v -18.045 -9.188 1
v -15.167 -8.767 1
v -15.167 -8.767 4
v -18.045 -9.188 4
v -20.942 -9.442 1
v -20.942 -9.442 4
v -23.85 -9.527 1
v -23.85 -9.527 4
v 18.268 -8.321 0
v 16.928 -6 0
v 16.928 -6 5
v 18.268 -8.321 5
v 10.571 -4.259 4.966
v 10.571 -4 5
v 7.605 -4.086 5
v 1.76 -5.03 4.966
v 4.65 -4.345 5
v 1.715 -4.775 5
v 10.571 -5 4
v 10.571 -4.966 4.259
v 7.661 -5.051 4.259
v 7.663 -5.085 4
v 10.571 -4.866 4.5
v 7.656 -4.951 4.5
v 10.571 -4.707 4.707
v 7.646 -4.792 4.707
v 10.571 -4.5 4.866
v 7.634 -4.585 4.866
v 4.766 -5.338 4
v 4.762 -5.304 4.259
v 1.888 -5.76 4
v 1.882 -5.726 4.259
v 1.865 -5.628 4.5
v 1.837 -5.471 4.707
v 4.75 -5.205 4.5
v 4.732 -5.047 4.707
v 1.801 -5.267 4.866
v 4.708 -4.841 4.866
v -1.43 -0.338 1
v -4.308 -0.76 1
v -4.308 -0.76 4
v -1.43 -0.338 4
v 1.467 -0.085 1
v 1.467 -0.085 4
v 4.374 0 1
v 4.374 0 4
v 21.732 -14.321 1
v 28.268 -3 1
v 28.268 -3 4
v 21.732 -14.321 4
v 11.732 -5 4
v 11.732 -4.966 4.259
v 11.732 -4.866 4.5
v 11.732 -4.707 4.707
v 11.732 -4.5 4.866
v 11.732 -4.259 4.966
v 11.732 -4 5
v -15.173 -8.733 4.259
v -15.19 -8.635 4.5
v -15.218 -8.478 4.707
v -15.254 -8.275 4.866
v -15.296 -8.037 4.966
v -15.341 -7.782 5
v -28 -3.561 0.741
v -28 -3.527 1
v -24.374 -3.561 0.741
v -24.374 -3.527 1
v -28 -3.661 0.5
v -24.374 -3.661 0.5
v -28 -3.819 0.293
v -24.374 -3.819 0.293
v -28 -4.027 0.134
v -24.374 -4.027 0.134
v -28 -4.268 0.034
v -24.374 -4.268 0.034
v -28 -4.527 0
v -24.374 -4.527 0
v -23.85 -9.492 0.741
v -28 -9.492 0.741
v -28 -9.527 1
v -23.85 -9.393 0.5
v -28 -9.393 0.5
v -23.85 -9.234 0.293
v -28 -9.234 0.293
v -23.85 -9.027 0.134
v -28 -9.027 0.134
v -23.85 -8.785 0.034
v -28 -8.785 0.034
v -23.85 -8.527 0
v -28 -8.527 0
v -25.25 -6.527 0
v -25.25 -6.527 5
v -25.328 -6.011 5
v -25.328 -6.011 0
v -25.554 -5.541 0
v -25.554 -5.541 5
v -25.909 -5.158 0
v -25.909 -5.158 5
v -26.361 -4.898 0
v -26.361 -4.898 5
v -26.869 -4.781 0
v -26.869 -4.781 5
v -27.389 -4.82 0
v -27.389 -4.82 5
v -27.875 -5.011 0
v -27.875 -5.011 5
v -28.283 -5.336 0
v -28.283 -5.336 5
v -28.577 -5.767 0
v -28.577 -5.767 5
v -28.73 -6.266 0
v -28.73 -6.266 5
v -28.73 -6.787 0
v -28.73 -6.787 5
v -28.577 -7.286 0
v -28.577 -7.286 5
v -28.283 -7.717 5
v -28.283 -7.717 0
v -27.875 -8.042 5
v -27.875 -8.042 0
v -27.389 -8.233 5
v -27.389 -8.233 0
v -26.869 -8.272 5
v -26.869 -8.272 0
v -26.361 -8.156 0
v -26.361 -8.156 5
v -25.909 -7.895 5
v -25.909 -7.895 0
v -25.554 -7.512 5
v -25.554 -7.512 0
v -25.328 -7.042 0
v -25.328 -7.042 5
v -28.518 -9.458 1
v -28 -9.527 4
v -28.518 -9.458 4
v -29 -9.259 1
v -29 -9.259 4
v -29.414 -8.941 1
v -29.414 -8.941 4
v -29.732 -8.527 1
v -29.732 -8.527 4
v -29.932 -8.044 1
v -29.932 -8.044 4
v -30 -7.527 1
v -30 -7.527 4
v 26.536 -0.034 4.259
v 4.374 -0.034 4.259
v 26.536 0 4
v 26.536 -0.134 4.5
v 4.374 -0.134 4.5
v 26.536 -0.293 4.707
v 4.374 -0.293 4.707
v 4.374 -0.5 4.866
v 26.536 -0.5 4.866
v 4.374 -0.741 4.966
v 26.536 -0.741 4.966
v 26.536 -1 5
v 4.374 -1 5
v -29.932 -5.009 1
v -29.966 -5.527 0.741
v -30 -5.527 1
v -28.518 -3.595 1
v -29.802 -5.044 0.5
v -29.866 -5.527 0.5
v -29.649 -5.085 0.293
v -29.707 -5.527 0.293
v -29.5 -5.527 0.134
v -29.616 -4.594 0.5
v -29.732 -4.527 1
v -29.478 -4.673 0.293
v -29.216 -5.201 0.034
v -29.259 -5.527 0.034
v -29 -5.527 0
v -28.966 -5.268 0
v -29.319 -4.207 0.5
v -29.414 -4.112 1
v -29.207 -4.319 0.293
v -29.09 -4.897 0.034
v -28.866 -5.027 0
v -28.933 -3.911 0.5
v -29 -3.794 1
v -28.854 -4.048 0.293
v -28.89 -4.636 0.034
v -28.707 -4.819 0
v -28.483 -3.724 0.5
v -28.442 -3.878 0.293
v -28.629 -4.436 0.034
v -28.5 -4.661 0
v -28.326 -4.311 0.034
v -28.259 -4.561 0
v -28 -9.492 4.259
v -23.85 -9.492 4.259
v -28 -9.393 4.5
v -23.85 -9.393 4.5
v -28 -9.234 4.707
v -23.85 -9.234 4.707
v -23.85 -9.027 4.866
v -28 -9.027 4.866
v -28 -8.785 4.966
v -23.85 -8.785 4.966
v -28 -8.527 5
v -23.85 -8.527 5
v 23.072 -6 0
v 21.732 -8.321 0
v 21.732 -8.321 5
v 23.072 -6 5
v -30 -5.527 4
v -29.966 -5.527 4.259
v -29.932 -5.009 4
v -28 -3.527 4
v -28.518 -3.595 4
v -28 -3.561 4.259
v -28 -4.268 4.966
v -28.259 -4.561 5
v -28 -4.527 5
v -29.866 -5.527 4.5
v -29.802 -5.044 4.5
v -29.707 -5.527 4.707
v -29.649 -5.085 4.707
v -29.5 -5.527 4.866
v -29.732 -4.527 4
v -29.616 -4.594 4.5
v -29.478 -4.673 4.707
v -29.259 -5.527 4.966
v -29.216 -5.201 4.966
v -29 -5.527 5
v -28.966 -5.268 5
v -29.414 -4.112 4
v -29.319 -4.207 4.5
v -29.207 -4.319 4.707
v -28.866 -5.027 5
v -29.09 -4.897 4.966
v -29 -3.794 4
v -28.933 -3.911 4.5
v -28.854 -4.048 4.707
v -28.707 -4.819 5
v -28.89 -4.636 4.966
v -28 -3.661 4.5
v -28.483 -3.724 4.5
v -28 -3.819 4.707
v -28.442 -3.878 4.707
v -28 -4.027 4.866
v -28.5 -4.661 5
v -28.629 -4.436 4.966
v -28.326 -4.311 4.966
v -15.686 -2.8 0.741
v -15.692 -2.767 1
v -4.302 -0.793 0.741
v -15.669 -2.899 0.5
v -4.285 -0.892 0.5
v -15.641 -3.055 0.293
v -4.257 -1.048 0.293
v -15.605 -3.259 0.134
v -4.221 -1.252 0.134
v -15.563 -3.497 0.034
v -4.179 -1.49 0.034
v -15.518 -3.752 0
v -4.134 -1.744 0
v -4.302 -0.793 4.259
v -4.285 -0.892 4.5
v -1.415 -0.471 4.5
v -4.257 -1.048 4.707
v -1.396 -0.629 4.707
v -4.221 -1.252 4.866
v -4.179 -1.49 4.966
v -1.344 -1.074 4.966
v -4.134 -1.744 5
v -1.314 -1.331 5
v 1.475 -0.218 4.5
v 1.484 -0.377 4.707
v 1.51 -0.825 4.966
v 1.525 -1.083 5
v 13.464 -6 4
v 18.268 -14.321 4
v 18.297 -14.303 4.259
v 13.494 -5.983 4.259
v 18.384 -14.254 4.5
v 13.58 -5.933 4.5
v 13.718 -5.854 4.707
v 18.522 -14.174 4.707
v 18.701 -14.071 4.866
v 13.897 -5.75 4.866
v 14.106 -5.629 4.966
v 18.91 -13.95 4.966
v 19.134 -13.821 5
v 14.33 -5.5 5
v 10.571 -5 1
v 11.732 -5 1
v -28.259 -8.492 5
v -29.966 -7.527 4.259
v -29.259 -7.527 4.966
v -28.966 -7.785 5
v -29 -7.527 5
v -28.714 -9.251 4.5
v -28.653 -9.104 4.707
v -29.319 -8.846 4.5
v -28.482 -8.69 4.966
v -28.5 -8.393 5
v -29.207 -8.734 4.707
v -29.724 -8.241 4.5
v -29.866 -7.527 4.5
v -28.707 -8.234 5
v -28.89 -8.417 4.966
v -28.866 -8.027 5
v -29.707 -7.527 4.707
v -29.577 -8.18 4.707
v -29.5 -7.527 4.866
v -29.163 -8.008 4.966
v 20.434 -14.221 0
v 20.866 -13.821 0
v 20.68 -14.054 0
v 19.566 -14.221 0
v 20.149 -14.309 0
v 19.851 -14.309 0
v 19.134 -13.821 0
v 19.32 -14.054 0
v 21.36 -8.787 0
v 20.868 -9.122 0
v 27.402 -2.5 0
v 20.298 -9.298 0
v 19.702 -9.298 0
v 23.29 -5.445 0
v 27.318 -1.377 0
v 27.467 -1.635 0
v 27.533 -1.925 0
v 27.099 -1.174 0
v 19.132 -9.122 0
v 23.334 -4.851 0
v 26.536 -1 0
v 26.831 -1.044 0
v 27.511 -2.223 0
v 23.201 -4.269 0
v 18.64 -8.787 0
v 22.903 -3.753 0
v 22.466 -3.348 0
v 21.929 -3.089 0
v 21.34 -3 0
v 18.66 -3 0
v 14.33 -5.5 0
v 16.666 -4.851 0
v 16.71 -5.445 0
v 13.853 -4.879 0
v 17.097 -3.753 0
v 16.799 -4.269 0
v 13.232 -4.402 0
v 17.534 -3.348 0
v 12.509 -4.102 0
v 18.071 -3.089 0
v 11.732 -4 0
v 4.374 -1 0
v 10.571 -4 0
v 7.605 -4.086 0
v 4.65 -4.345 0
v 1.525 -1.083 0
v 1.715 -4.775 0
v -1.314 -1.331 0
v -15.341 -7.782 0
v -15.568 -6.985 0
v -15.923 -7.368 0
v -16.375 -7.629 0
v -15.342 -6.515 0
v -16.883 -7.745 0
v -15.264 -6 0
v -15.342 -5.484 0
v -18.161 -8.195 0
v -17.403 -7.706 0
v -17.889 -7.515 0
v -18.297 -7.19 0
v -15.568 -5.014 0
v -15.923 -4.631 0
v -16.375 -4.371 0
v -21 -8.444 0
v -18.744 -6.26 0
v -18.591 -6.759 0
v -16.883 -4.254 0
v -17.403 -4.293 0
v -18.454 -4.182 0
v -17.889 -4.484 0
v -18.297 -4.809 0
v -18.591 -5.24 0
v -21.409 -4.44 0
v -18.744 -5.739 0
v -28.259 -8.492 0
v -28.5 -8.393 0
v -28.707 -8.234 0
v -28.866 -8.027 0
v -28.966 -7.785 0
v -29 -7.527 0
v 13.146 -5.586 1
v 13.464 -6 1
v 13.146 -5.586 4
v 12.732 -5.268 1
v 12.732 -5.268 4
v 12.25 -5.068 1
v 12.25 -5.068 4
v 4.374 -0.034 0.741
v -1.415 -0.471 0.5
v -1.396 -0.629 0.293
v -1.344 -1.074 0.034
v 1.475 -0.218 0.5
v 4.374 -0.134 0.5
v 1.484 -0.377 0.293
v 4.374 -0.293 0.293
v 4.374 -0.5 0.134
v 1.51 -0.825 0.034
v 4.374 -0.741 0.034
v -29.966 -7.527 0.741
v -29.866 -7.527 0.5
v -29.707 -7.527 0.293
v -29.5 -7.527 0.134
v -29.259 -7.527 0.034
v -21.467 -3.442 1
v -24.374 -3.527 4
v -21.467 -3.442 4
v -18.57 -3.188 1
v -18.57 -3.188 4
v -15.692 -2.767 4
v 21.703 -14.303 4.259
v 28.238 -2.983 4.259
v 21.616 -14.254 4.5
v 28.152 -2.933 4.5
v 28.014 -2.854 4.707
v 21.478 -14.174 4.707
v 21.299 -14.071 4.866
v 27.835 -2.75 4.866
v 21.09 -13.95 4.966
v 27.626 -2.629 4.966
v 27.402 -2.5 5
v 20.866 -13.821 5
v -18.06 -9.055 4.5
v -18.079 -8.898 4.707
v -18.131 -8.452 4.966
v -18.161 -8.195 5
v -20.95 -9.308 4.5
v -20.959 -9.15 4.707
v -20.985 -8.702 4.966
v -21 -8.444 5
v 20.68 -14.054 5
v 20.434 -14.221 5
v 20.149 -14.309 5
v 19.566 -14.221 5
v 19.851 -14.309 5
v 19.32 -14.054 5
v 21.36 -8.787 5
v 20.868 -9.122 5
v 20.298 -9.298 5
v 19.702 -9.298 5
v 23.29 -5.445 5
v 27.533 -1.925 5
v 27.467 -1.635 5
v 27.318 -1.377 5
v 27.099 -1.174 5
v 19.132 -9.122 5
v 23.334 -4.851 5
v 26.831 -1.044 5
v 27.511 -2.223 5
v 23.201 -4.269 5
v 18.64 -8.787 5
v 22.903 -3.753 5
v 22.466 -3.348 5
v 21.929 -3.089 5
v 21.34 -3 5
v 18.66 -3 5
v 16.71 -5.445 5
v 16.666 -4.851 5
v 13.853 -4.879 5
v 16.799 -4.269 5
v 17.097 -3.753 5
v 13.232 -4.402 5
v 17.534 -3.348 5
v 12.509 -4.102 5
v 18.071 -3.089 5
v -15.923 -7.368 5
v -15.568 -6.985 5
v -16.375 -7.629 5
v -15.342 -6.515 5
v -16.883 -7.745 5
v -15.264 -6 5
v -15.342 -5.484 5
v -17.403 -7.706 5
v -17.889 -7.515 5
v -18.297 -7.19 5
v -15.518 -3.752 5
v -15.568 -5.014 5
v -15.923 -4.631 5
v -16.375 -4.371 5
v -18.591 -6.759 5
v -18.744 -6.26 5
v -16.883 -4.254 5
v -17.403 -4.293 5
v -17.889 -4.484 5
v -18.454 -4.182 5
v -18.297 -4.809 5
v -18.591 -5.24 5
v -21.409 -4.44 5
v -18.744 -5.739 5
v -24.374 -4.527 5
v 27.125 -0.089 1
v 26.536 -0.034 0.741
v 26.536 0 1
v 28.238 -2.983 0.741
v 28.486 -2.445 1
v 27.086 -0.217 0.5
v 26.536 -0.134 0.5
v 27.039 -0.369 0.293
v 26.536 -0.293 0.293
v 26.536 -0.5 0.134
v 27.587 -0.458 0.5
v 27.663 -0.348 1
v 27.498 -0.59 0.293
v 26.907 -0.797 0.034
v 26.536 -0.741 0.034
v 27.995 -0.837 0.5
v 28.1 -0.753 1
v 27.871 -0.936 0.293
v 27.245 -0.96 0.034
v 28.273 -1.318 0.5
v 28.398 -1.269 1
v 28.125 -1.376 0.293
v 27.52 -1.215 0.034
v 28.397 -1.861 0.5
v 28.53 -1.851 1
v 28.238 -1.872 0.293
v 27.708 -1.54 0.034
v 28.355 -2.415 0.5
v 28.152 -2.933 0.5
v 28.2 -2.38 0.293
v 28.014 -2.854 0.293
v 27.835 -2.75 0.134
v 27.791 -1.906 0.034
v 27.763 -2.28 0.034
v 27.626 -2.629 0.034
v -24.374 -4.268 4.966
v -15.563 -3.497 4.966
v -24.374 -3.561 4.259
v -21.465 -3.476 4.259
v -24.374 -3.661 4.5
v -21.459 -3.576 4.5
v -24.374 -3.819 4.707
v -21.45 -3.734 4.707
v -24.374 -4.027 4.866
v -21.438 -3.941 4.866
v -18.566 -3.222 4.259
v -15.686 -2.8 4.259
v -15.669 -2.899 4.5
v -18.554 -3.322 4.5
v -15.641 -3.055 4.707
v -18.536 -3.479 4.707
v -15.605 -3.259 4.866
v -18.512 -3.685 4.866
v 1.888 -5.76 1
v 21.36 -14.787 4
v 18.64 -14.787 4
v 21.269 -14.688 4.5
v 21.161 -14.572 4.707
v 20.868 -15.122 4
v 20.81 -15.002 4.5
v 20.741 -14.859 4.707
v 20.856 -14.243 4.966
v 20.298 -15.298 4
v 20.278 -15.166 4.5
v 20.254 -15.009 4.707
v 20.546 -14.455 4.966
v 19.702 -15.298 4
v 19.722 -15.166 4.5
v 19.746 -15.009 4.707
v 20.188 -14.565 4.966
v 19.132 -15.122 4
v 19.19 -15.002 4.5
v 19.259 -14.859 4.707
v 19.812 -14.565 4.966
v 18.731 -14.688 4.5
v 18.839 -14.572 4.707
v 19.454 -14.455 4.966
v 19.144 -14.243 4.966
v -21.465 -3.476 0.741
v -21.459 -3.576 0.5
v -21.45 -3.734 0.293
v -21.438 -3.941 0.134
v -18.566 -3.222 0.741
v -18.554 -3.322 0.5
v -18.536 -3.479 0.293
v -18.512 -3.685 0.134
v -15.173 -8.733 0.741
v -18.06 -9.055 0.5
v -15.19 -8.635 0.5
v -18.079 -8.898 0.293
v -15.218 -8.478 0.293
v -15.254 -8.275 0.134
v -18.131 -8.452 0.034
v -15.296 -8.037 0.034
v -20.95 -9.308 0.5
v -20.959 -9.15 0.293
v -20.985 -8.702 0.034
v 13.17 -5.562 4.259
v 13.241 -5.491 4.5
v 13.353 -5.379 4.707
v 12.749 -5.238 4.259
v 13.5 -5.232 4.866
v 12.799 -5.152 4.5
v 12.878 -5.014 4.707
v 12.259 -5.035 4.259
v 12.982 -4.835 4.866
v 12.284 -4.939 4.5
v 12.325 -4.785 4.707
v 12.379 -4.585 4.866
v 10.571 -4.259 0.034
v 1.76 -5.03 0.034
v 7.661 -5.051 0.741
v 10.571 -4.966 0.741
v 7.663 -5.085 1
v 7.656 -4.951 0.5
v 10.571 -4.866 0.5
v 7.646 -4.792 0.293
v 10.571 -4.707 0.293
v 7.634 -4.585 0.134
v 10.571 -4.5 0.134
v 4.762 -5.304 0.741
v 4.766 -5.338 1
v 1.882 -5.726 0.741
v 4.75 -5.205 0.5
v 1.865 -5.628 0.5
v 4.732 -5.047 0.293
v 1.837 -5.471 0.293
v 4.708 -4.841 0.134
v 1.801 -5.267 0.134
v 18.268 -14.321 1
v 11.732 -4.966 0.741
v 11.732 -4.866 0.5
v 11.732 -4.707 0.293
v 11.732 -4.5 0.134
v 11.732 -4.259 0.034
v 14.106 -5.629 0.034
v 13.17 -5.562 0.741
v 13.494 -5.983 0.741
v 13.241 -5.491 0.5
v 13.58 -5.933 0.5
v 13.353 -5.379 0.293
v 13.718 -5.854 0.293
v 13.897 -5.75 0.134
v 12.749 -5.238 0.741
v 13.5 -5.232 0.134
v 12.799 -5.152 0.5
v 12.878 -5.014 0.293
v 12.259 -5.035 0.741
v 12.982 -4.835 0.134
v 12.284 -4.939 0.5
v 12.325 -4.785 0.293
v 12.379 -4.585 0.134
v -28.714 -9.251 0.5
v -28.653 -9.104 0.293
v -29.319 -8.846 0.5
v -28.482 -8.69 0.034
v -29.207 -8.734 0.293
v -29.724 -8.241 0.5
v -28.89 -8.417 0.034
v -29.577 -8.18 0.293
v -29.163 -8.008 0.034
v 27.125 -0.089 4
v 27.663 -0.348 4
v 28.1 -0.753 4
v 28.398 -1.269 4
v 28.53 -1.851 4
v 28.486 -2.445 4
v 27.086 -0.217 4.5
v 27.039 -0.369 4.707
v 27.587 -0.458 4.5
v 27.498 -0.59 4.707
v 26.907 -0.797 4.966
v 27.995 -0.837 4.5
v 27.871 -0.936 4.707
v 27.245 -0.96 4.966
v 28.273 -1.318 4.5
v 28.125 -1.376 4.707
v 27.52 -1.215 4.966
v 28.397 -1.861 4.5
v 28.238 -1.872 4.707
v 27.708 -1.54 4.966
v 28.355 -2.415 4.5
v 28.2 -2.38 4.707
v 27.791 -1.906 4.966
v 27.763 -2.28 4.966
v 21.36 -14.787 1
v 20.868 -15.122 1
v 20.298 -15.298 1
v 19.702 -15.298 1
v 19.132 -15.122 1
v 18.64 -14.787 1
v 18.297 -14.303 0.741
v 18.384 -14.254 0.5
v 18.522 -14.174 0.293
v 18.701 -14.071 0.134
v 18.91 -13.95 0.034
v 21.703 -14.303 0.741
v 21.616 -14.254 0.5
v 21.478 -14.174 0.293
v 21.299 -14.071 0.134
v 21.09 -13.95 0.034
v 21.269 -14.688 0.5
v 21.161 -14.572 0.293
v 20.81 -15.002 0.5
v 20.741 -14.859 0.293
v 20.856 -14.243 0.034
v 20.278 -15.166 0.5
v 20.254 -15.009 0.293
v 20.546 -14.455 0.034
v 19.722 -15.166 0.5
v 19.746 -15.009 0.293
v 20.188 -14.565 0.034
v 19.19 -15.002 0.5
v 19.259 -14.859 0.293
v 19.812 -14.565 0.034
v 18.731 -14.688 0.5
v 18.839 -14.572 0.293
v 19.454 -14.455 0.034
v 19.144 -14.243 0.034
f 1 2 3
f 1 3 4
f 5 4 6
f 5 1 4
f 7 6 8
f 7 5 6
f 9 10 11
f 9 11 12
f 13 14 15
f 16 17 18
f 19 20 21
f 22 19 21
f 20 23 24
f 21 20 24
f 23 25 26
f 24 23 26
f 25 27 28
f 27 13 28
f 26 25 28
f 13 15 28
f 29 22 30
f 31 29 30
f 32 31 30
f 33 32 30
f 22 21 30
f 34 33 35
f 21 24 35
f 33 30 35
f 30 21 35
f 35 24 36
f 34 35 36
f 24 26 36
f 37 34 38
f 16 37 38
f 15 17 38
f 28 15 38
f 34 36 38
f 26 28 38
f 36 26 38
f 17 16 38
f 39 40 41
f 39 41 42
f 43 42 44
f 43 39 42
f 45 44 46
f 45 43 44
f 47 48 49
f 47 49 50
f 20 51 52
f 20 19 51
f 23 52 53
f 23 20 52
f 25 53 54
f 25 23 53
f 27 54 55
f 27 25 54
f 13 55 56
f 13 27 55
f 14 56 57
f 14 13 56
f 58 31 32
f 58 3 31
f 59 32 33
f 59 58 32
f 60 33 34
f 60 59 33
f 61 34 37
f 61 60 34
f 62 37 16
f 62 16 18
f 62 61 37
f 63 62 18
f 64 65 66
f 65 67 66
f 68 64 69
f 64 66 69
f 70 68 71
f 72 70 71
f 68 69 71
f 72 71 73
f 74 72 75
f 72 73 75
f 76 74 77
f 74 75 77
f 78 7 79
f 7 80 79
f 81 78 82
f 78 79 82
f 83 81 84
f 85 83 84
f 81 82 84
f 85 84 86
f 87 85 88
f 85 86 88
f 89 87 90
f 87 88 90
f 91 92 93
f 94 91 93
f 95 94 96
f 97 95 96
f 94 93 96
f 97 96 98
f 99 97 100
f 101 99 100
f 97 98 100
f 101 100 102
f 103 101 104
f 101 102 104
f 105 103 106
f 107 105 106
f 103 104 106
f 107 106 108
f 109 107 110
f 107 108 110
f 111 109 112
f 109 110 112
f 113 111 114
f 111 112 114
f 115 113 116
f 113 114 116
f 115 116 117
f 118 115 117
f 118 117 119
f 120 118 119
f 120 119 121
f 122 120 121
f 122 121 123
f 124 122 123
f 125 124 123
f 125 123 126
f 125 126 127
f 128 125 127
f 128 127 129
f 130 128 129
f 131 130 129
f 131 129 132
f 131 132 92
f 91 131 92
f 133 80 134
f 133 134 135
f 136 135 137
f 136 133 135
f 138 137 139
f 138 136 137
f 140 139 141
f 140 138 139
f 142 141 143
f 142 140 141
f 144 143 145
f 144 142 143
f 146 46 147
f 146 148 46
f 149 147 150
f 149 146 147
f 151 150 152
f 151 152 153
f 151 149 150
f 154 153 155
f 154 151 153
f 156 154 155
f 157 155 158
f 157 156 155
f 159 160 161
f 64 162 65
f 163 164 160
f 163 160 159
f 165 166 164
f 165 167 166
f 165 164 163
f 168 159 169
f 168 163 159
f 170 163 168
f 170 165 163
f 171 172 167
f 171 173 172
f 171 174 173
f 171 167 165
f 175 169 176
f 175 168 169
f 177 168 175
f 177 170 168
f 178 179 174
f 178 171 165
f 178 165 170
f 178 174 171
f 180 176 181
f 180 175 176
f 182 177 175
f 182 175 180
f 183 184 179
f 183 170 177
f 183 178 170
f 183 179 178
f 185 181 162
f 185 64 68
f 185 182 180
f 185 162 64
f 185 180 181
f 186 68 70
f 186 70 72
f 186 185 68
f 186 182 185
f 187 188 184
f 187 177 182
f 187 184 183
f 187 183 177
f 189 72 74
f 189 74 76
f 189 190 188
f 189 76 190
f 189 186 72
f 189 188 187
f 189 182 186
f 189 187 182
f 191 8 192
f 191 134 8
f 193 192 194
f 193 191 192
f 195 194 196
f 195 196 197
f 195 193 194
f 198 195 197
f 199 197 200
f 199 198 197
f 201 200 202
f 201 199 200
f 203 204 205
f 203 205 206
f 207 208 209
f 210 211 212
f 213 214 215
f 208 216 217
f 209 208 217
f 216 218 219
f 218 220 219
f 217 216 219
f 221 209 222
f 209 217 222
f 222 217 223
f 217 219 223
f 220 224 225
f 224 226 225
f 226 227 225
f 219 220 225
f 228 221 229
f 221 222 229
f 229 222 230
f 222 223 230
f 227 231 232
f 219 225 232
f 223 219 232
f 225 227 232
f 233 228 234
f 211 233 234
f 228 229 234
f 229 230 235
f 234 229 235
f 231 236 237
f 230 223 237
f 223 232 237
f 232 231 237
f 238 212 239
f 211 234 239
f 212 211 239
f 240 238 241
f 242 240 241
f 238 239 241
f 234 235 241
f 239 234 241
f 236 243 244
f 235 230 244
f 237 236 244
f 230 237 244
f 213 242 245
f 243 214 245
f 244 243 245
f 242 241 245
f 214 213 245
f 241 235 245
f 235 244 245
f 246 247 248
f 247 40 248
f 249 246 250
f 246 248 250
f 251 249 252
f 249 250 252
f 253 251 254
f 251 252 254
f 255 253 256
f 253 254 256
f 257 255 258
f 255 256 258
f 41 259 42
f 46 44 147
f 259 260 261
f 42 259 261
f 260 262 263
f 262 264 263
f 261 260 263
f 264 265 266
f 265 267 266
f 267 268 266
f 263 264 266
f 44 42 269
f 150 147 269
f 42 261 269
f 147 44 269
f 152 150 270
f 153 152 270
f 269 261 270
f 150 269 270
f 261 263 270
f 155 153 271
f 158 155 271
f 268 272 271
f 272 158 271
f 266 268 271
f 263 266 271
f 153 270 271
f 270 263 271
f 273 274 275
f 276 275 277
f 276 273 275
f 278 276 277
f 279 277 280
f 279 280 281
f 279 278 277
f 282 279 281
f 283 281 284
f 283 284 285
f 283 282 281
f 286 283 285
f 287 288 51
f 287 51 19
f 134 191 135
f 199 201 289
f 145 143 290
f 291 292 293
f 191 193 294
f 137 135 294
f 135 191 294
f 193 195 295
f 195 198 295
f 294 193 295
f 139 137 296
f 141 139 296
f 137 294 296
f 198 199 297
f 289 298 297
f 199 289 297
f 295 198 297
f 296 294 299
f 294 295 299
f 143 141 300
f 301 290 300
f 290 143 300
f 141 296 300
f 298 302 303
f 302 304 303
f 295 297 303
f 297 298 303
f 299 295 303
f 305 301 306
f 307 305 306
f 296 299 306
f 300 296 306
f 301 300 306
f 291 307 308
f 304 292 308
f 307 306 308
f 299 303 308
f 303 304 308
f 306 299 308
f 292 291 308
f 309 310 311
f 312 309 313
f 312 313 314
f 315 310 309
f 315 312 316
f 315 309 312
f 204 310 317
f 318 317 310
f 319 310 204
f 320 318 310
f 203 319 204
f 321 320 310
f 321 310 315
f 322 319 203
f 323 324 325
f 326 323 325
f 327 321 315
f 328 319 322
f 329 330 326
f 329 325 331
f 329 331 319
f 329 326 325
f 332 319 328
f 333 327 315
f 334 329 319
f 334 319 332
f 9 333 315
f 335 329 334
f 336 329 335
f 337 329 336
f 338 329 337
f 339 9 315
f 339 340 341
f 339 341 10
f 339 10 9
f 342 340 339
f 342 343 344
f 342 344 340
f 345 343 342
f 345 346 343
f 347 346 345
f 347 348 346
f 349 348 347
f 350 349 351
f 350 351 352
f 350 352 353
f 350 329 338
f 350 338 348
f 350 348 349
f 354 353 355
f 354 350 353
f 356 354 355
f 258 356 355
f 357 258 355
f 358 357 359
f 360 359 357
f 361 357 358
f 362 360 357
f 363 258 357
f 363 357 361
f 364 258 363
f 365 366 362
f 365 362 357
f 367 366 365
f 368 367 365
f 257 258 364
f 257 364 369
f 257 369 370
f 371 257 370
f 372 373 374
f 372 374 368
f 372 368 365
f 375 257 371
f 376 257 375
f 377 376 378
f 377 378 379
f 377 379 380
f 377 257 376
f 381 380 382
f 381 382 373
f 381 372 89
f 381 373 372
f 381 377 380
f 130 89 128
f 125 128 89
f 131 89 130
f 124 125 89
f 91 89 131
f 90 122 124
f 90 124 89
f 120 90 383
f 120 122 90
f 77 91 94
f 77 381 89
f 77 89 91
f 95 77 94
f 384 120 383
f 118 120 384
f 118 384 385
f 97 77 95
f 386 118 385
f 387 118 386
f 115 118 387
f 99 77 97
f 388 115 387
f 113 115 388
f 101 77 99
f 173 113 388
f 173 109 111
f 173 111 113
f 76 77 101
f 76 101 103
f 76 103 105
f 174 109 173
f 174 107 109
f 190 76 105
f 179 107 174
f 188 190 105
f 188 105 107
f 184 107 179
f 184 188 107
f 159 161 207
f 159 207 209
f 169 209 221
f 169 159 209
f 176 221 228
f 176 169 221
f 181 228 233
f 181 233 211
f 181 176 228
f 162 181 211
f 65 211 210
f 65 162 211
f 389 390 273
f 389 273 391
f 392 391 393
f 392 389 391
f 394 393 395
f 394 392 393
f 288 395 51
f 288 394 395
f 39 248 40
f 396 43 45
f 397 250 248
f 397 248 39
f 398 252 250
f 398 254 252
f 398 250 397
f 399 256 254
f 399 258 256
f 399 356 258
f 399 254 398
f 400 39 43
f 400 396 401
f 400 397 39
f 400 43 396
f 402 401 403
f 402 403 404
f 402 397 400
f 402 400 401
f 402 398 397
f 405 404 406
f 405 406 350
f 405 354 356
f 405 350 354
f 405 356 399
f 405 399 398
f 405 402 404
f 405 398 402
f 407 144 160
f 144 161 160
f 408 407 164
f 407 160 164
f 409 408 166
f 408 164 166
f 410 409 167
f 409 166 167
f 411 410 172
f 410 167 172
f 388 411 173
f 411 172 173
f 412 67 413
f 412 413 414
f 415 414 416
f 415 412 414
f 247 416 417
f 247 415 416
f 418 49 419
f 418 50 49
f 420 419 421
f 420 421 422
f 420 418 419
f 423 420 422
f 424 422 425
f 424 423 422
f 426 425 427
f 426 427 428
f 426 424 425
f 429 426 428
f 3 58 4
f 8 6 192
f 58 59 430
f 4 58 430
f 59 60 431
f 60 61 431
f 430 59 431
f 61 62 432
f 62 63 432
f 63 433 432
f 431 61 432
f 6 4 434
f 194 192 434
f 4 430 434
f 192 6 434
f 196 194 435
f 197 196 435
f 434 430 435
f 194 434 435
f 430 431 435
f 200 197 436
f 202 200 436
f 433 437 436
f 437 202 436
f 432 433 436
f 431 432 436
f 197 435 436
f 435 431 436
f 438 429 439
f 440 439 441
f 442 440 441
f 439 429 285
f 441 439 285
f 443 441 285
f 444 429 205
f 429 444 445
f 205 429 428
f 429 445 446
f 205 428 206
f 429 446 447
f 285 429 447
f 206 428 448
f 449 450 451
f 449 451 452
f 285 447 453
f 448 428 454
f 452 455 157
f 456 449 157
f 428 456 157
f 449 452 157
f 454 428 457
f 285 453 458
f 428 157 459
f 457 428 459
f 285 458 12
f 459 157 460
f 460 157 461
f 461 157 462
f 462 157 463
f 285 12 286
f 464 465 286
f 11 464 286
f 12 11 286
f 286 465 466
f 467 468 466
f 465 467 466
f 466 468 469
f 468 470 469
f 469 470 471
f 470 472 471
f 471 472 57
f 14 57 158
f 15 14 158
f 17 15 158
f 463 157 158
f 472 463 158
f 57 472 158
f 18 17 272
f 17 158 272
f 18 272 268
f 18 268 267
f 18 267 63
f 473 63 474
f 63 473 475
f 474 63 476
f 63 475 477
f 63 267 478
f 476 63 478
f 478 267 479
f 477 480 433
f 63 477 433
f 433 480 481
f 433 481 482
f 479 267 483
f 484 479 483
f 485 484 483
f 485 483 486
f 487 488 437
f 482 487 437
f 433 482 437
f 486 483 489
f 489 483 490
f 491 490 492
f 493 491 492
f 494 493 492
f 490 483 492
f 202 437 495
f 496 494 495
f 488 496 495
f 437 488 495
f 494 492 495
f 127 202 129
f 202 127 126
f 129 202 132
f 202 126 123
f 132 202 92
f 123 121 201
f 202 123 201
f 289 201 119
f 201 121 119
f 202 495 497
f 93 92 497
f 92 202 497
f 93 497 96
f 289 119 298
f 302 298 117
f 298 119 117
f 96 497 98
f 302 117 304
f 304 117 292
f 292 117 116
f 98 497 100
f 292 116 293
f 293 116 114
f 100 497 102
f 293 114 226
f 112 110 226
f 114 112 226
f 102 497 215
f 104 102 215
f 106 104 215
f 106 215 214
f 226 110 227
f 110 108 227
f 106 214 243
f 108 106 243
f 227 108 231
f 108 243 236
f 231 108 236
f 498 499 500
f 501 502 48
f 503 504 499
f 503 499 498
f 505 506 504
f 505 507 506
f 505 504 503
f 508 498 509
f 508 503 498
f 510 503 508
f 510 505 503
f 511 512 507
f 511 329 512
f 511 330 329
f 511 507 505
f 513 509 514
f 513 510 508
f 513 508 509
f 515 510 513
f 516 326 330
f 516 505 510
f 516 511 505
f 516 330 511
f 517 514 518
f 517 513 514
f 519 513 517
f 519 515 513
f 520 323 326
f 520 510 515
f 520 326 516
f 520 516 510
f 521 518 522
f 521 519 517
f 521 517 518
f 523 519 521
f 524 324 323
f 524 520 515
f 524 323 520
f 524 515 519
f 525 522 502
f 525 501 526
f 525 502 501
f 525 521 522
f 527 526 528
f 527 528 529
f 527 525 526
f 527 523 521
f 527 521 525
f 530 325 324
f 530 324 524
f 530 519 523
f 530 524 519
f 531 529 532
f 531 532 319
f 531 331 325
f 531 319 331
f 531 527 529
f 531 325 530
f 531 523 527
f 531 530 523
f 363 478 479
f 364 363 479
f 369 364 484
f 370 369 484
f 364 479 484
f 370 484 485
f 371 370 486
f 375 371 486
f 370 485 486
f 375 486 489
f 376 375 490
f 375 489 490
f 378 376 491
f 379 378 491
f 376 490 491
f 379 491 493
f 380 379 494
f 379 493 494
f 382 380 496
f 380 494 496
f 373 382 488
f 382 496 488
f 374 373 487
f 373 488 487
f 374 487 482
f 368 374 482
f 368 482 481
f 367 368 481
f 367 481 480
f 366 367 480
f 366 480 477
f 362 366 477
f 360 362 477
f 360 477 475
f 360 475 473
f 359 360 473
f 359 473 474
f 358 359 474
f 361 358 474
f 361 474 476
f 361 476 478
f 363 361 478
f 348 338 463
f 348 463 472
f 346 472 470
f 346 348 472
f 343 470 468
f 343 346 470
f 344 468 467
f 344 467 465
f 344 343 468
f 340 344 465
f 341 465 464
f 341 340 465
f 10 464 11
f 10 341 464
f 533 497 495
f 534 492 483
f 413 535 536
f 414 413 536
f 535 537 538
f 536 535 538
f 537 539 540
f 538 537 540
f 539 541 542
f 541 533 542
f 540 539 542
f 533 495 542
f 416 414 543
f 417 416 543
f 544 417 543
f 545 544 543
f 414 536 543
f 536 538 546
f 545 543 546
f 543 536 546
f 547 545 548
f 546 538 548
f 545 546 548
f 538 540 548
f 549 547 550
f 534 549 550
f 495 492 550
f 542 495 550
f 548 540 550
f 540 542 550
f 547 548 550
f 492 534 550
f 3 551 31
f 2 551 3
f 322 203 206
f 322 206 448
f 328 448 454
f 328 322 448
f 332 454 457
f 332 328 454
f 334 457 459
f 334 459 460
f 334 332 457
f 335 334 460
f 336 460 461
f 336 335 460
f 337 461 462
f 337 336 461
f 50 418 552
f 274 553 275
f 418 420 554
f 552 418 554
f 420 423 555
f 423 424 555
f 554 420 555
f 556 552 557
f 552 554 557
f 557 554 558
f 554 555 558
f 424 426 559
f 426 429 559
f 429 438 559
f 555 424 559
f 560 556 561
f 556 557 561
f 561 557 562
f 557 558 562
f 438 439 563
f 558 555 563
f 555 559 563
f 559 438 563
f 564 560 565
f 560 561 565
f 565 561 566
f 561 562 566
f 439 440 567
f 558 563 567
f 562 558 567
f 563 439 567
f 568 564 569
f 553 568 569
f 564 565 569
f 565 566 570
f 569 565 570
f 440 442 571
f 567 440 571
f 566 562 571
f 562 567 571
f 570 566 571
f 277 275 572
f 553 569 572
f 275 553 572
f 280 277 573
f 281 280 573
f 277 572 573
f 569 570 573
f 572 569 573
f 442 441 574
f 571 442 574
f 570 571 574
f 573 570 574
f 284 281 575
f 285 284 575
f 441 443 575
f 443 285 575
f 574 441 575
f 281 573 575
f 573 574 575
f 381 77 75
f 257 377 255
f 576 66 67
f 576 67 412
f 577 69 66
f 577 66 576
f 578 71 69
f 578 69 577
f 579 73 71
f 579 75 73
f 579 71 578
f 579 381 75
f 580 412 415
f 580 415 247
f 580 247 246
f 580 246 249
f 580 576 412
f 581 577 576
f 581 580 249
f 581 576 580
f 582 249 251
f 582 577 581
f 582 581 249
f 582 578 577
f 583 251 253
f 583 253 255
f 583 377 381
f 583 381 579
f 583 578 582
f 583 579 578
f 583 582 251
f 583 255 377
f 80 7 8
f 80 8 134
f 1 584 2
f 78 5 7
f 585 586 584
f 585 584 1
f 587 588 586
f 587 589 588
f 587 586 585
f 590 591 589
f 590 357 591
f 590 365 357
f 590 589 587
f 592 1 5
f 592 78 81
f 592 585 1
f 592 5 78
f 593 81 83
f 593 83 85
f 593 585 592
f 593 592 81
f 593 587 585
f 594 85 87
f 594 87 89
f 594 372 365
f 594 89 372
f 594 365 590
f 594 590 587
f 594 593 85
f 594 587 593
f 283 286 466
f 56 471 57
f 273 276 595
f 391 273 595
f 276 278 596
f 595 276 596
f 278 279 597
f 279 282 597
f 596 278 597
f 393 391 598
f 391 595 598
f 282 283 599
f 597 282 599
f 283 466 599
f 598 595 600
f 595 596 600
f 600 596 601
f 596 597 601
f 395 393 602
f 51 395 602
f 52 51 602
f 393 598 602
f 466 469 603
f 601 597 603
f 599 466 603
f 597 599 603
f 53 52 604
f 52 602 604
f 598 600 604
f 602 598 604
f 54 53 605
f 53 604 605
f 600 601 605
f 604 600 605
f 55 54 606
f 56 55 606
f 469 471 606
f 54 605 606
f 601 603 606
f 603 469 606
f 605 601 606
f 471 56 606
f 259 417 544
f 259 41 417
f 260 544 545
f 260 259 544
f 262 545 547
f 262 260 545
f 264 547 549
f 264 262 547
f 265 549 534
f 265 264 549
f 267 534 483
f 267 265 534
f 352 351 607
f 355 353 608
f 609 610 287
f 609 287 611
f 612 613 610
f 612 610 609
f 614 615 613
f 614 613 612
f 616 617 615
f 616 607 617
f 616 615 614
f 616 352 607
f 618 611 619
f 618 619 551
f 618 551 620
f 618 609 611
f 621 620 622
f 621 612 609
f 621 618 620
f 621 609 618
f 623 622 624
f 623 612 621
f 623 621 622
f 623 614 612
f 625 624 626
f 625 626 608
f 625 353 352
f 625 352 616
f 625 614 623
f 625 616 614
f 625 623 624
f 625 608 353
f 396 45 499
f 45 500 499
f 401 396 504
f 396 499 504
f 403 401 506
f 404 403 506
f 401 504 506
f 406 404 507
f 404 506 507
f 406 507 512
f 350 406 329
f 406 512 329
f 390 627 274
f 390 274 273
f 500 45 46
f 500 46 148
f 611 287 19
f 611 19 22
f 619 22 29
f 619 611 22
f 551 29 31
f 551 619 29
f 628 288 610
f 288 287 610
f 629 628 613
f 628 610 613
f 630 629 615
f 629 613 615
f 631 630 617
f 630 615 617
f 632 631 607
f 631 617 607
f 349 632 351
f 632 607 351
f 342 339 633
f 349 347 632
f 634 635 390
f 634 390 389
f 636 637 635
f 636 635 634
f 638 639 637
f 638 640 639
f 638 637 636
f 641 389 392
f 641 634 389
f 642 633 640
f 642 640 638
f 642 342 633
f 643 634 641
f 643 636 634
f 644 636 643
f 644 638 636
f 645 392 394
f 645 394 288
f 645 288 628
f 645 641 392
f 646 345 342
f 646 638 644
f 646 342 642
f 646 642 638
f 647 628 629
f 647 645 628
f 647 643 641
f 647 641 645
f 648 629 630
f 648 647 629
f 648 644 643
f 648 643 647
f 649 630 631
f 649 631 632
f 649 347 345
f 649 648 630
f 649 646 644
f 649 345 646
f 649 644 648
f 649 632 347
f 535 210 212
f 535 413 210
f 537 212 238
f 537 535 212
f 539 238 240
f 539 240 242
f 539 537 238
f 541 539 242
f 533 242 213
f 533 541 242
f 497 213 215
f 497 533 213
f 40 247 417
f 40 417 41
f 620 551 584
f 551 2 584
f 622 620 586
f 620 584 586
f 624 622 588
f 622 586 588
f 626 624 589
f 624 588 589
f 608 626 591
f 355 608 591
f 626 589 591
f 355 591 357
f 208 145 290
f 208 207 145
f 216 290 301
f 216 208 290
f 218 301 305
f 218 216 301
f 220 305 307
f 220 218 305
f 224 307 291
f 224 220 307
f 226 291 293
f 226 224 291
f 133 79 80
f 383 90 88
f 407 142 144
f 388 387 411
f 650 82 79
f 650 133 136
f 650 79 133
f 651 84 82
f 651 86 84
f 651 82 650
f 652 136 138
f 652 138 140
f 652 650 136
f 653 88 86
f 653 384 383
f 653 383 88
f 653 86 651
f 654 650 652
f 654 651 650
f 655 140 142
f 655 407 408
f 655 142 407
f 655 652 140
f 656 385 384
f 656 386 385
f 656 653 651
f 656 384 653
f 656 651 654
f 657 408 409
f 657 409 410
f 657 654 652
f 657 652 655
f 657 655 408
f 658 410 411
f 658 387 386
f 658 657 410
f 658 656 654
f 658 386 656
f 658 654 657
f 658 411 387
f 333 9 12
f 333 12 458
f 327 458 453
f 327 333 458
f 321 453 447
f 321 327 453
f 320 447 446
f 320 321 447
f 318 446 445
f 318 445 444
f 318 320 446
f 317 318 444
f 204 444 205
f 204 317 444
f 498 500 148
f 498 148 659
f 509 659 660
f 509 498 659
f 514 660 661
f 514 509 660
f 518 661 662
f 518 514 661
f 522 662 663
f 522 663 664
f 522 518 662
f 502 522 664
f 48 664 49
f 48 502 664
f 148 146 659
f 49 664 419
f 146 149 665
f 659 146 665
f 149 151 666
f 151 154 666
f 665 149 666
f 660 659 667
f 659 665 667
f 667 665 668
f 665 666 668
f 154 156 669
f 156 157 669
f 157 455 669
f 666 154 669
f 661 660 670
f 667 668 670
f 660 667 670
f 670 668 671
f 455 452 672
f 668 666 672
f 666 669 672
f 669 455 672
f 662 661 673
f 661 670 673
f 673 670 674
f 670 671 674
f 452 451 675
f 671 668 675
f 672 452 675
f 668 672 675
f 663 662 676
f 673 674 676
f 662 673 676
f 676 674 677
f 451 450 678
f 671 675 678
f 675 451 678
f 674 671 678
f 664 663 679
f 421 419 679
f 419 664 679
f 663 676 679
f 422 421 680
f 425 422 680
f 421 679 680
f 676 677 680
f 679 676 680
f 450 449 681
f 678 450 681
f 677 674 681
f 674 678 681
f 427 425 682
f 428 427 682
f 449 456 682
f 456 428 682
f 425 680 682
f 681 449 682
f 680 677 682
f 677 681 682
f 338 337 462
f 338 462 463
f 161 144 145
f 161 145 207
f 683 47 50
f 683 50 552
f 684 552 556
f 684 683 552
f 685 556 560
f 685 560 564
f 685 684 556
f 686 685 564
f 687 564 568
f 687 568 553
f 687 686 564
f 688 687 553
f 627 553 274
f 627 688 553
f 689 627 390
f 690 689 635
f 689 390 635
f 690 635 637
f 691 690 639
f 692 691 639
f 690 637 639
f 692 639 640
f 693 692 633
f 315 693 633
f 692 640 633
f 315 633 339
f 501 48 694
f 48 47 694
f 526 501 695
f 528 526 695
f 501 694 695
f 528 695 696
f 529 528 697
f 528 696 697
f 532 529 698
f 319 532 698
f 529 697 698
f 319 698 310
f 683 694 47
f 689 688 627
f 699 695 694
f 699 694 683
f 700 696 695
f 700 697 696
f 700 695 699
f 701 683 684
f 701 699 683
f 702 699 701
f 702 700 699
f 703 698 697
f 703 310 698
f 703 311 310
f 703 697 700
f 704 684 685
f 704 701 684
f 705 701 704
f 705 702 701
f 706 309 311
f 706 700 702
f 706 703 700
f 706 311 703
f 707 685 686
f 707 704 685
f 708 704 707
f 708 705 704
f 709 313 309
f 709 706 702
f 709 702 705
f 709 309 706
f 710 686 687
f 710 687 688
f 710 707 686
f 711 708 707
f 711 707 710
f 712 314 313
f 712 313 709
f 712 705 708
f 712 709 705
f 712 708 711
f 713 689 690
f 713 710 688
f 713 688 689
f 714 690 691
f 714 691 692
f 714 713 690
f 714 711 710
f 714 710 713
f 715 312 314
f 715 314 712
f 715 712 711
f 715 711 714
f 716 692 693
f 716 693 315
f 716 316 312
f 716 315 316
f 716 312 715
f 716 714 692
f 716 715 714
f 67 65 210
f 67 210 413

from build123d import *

# Parameters (mm, degrees)
BOSS_EXTRUDE1_DEPTH = 5
FILLET1_R           = 1
SKETCH2_R           = 1.75
CUT_EXTRUDE1_DEPTH  = 35.054632191


with BuildPart() as part:
    # Sketch1 → Boss-Extrude1 (new body)
    with BuildSketch(Plane.XY):
        with BuildLine():
            Line((4.374433176, 0), (26.535898385, 0))
            ThreePointArc((26.535898385, 0), (28.267949192, -1), (28.267949192, -3))
            Line((28.267949192, -3), (21.732050808, -14.320508076))
            ThreePointArc((21.732050808, -14.320508076), (20, -15.320508076), (18.267949192, -14.320508076))
            Line((18.267949192, -14.320508076), (13.464101615, -6))
            ThreePointArc((13.464101615, -6), (12.732050808, -5.267949192), (11.732050808, -5))
            Line((11.732050808, -5), (10.570646977, -5))
            ThreePointArc((10.570646977, -5), (6.21285984, -5.190265095), (1.888238094, -5.759612349))
            Line((1.888238094, -5.759612349), (-15.167092312, -8.766927265))
            ThreePointArc((-15.167092312, -8.766927265), (-19.491714058, -9.336274519), (-23.849501195, -9.526539614))
            Line((-23.849501195, -9.526539614), (-28, -9.526539614))
            ThreePointArc((-28, -9.526539614), (-29.414213562, -8.940753177), (-30, -7.526539614))
            Line((-30, -7.526539614), (-30, -5.526539614))
            ThreePointArc((-30, -5.526539614), (-29.414213562, -4.112326052), (-28, -3.526539614))
            Line((-28, -3.526539614), (-24.374433176, -3.526539614))
            ThreePointArc((-24.374433176, -3.526539614), (-20.016646039, -3.336274519), (-15.692024293, -2.766927265))
            Line((-15.692024293, -2.766927265), (-4.307975707, -0.759612349))
            ThreePointArc((-4.307975707, -0.759612349), (0.016646039, -0.190265095), (4.374433176, 0))
        make_face()
        with BuildLine():
            Line((21.732050808, -8.320508076), (23.07179677, -6))
            ThreePointArc((23.07179677, -6), (23.07179677, -4), (21.339745962, -3))
            Line((21.339745962, -3), (18.660254038, -3))
            ThreePointArc((18.660254038, -3), (16.92820323, -4), (16.92820323, -6))
            Line((16.92820323, -6), (18.267949192, -8.320508076))
            ThreePointArc((18.267949192, -8.320508076), (20, -9.320508076), (21.732050808, -8.320508076))
        make_face(mode=Mode.SUBTRACT)
    extrude(amount=BOSS_EXTRUDE1_DEPTH)

    # Fillet1
    fillet1_edges = [part.edges().sort_by_distance(p)[0] for p in [
        (-19.491714058, -9.336274519, 5),
        (-6.639427109, -7.263269807, 5),
        (-30, -6.526539614, 0),
        (-29.414213562, -4.112326052, 0),
        (-26.187216588, -3.526539614, 0),
        (-20.016646039, -3.336274519, 0),
        (-10, -1.763269807, 0),
        (0.016646039, -0.190265095, 0),
        (15.455165781, 0, 0),
        (28.267949192, -1, 0),
        (25, -8.660254038, 0),
        (6.21285984, -5.190265095, 5),
        (20, -15.320508076, 0),
        (15.866025404, -10.160254038, 0),
        (12.732050808, -5.267949192, 0),
        (11.151348892, -5, 0),
        (6.21285984, -5.190265095, 0),
        (-6.639427109, -7.263269807, 0),
        (-19.491714058, -9.336274519, 0),
        (-25.924750598, -9.526539614, 0),
        (-29.414213562, -8.940753177, 0),
        (11.151348892, -5, 5),
        (12.732050808, -5.267949192, 5),
        (15.866025404, -10.160254038, 5),
        (20, -15.320508076, 5),
        (25, -8.660254038, 5),
        (28.267949192, -1, 5),
        (15.455165781, 0, 5),
        (-29.414213562, -8.940753177, 5),
        (0.016646039, -0.190265095, 5),
        (-10, -1.763269807, 5),
        (-20.016646039, -3.336274519, 5),
        (-26.187216588, -3.526539614, 5),
        (-29.414213562, -4.112326052, 5),
        (-30, -6.526539614, 5),
        (-25.924750598, -9.526539614, 5),
    ]]
    fillet(fillet1_edges, radius=FILLET1_R)

    # Sketch2 → Cut-Extrude1 (cut, through all)
    with BuildSketch(Plane.XY.offset(5)):
        with Locations((-17.013893068, -5.999597174)):
            Circle(SKETCH2_R)
        with Locations((-27, -6.526539614)):
            Circle(SKETCH2_R)
    extrude(amount=-CUT_EXTRUDE1_DEPTH, mode=Mode.SUBTRACT)


solid = part.part
